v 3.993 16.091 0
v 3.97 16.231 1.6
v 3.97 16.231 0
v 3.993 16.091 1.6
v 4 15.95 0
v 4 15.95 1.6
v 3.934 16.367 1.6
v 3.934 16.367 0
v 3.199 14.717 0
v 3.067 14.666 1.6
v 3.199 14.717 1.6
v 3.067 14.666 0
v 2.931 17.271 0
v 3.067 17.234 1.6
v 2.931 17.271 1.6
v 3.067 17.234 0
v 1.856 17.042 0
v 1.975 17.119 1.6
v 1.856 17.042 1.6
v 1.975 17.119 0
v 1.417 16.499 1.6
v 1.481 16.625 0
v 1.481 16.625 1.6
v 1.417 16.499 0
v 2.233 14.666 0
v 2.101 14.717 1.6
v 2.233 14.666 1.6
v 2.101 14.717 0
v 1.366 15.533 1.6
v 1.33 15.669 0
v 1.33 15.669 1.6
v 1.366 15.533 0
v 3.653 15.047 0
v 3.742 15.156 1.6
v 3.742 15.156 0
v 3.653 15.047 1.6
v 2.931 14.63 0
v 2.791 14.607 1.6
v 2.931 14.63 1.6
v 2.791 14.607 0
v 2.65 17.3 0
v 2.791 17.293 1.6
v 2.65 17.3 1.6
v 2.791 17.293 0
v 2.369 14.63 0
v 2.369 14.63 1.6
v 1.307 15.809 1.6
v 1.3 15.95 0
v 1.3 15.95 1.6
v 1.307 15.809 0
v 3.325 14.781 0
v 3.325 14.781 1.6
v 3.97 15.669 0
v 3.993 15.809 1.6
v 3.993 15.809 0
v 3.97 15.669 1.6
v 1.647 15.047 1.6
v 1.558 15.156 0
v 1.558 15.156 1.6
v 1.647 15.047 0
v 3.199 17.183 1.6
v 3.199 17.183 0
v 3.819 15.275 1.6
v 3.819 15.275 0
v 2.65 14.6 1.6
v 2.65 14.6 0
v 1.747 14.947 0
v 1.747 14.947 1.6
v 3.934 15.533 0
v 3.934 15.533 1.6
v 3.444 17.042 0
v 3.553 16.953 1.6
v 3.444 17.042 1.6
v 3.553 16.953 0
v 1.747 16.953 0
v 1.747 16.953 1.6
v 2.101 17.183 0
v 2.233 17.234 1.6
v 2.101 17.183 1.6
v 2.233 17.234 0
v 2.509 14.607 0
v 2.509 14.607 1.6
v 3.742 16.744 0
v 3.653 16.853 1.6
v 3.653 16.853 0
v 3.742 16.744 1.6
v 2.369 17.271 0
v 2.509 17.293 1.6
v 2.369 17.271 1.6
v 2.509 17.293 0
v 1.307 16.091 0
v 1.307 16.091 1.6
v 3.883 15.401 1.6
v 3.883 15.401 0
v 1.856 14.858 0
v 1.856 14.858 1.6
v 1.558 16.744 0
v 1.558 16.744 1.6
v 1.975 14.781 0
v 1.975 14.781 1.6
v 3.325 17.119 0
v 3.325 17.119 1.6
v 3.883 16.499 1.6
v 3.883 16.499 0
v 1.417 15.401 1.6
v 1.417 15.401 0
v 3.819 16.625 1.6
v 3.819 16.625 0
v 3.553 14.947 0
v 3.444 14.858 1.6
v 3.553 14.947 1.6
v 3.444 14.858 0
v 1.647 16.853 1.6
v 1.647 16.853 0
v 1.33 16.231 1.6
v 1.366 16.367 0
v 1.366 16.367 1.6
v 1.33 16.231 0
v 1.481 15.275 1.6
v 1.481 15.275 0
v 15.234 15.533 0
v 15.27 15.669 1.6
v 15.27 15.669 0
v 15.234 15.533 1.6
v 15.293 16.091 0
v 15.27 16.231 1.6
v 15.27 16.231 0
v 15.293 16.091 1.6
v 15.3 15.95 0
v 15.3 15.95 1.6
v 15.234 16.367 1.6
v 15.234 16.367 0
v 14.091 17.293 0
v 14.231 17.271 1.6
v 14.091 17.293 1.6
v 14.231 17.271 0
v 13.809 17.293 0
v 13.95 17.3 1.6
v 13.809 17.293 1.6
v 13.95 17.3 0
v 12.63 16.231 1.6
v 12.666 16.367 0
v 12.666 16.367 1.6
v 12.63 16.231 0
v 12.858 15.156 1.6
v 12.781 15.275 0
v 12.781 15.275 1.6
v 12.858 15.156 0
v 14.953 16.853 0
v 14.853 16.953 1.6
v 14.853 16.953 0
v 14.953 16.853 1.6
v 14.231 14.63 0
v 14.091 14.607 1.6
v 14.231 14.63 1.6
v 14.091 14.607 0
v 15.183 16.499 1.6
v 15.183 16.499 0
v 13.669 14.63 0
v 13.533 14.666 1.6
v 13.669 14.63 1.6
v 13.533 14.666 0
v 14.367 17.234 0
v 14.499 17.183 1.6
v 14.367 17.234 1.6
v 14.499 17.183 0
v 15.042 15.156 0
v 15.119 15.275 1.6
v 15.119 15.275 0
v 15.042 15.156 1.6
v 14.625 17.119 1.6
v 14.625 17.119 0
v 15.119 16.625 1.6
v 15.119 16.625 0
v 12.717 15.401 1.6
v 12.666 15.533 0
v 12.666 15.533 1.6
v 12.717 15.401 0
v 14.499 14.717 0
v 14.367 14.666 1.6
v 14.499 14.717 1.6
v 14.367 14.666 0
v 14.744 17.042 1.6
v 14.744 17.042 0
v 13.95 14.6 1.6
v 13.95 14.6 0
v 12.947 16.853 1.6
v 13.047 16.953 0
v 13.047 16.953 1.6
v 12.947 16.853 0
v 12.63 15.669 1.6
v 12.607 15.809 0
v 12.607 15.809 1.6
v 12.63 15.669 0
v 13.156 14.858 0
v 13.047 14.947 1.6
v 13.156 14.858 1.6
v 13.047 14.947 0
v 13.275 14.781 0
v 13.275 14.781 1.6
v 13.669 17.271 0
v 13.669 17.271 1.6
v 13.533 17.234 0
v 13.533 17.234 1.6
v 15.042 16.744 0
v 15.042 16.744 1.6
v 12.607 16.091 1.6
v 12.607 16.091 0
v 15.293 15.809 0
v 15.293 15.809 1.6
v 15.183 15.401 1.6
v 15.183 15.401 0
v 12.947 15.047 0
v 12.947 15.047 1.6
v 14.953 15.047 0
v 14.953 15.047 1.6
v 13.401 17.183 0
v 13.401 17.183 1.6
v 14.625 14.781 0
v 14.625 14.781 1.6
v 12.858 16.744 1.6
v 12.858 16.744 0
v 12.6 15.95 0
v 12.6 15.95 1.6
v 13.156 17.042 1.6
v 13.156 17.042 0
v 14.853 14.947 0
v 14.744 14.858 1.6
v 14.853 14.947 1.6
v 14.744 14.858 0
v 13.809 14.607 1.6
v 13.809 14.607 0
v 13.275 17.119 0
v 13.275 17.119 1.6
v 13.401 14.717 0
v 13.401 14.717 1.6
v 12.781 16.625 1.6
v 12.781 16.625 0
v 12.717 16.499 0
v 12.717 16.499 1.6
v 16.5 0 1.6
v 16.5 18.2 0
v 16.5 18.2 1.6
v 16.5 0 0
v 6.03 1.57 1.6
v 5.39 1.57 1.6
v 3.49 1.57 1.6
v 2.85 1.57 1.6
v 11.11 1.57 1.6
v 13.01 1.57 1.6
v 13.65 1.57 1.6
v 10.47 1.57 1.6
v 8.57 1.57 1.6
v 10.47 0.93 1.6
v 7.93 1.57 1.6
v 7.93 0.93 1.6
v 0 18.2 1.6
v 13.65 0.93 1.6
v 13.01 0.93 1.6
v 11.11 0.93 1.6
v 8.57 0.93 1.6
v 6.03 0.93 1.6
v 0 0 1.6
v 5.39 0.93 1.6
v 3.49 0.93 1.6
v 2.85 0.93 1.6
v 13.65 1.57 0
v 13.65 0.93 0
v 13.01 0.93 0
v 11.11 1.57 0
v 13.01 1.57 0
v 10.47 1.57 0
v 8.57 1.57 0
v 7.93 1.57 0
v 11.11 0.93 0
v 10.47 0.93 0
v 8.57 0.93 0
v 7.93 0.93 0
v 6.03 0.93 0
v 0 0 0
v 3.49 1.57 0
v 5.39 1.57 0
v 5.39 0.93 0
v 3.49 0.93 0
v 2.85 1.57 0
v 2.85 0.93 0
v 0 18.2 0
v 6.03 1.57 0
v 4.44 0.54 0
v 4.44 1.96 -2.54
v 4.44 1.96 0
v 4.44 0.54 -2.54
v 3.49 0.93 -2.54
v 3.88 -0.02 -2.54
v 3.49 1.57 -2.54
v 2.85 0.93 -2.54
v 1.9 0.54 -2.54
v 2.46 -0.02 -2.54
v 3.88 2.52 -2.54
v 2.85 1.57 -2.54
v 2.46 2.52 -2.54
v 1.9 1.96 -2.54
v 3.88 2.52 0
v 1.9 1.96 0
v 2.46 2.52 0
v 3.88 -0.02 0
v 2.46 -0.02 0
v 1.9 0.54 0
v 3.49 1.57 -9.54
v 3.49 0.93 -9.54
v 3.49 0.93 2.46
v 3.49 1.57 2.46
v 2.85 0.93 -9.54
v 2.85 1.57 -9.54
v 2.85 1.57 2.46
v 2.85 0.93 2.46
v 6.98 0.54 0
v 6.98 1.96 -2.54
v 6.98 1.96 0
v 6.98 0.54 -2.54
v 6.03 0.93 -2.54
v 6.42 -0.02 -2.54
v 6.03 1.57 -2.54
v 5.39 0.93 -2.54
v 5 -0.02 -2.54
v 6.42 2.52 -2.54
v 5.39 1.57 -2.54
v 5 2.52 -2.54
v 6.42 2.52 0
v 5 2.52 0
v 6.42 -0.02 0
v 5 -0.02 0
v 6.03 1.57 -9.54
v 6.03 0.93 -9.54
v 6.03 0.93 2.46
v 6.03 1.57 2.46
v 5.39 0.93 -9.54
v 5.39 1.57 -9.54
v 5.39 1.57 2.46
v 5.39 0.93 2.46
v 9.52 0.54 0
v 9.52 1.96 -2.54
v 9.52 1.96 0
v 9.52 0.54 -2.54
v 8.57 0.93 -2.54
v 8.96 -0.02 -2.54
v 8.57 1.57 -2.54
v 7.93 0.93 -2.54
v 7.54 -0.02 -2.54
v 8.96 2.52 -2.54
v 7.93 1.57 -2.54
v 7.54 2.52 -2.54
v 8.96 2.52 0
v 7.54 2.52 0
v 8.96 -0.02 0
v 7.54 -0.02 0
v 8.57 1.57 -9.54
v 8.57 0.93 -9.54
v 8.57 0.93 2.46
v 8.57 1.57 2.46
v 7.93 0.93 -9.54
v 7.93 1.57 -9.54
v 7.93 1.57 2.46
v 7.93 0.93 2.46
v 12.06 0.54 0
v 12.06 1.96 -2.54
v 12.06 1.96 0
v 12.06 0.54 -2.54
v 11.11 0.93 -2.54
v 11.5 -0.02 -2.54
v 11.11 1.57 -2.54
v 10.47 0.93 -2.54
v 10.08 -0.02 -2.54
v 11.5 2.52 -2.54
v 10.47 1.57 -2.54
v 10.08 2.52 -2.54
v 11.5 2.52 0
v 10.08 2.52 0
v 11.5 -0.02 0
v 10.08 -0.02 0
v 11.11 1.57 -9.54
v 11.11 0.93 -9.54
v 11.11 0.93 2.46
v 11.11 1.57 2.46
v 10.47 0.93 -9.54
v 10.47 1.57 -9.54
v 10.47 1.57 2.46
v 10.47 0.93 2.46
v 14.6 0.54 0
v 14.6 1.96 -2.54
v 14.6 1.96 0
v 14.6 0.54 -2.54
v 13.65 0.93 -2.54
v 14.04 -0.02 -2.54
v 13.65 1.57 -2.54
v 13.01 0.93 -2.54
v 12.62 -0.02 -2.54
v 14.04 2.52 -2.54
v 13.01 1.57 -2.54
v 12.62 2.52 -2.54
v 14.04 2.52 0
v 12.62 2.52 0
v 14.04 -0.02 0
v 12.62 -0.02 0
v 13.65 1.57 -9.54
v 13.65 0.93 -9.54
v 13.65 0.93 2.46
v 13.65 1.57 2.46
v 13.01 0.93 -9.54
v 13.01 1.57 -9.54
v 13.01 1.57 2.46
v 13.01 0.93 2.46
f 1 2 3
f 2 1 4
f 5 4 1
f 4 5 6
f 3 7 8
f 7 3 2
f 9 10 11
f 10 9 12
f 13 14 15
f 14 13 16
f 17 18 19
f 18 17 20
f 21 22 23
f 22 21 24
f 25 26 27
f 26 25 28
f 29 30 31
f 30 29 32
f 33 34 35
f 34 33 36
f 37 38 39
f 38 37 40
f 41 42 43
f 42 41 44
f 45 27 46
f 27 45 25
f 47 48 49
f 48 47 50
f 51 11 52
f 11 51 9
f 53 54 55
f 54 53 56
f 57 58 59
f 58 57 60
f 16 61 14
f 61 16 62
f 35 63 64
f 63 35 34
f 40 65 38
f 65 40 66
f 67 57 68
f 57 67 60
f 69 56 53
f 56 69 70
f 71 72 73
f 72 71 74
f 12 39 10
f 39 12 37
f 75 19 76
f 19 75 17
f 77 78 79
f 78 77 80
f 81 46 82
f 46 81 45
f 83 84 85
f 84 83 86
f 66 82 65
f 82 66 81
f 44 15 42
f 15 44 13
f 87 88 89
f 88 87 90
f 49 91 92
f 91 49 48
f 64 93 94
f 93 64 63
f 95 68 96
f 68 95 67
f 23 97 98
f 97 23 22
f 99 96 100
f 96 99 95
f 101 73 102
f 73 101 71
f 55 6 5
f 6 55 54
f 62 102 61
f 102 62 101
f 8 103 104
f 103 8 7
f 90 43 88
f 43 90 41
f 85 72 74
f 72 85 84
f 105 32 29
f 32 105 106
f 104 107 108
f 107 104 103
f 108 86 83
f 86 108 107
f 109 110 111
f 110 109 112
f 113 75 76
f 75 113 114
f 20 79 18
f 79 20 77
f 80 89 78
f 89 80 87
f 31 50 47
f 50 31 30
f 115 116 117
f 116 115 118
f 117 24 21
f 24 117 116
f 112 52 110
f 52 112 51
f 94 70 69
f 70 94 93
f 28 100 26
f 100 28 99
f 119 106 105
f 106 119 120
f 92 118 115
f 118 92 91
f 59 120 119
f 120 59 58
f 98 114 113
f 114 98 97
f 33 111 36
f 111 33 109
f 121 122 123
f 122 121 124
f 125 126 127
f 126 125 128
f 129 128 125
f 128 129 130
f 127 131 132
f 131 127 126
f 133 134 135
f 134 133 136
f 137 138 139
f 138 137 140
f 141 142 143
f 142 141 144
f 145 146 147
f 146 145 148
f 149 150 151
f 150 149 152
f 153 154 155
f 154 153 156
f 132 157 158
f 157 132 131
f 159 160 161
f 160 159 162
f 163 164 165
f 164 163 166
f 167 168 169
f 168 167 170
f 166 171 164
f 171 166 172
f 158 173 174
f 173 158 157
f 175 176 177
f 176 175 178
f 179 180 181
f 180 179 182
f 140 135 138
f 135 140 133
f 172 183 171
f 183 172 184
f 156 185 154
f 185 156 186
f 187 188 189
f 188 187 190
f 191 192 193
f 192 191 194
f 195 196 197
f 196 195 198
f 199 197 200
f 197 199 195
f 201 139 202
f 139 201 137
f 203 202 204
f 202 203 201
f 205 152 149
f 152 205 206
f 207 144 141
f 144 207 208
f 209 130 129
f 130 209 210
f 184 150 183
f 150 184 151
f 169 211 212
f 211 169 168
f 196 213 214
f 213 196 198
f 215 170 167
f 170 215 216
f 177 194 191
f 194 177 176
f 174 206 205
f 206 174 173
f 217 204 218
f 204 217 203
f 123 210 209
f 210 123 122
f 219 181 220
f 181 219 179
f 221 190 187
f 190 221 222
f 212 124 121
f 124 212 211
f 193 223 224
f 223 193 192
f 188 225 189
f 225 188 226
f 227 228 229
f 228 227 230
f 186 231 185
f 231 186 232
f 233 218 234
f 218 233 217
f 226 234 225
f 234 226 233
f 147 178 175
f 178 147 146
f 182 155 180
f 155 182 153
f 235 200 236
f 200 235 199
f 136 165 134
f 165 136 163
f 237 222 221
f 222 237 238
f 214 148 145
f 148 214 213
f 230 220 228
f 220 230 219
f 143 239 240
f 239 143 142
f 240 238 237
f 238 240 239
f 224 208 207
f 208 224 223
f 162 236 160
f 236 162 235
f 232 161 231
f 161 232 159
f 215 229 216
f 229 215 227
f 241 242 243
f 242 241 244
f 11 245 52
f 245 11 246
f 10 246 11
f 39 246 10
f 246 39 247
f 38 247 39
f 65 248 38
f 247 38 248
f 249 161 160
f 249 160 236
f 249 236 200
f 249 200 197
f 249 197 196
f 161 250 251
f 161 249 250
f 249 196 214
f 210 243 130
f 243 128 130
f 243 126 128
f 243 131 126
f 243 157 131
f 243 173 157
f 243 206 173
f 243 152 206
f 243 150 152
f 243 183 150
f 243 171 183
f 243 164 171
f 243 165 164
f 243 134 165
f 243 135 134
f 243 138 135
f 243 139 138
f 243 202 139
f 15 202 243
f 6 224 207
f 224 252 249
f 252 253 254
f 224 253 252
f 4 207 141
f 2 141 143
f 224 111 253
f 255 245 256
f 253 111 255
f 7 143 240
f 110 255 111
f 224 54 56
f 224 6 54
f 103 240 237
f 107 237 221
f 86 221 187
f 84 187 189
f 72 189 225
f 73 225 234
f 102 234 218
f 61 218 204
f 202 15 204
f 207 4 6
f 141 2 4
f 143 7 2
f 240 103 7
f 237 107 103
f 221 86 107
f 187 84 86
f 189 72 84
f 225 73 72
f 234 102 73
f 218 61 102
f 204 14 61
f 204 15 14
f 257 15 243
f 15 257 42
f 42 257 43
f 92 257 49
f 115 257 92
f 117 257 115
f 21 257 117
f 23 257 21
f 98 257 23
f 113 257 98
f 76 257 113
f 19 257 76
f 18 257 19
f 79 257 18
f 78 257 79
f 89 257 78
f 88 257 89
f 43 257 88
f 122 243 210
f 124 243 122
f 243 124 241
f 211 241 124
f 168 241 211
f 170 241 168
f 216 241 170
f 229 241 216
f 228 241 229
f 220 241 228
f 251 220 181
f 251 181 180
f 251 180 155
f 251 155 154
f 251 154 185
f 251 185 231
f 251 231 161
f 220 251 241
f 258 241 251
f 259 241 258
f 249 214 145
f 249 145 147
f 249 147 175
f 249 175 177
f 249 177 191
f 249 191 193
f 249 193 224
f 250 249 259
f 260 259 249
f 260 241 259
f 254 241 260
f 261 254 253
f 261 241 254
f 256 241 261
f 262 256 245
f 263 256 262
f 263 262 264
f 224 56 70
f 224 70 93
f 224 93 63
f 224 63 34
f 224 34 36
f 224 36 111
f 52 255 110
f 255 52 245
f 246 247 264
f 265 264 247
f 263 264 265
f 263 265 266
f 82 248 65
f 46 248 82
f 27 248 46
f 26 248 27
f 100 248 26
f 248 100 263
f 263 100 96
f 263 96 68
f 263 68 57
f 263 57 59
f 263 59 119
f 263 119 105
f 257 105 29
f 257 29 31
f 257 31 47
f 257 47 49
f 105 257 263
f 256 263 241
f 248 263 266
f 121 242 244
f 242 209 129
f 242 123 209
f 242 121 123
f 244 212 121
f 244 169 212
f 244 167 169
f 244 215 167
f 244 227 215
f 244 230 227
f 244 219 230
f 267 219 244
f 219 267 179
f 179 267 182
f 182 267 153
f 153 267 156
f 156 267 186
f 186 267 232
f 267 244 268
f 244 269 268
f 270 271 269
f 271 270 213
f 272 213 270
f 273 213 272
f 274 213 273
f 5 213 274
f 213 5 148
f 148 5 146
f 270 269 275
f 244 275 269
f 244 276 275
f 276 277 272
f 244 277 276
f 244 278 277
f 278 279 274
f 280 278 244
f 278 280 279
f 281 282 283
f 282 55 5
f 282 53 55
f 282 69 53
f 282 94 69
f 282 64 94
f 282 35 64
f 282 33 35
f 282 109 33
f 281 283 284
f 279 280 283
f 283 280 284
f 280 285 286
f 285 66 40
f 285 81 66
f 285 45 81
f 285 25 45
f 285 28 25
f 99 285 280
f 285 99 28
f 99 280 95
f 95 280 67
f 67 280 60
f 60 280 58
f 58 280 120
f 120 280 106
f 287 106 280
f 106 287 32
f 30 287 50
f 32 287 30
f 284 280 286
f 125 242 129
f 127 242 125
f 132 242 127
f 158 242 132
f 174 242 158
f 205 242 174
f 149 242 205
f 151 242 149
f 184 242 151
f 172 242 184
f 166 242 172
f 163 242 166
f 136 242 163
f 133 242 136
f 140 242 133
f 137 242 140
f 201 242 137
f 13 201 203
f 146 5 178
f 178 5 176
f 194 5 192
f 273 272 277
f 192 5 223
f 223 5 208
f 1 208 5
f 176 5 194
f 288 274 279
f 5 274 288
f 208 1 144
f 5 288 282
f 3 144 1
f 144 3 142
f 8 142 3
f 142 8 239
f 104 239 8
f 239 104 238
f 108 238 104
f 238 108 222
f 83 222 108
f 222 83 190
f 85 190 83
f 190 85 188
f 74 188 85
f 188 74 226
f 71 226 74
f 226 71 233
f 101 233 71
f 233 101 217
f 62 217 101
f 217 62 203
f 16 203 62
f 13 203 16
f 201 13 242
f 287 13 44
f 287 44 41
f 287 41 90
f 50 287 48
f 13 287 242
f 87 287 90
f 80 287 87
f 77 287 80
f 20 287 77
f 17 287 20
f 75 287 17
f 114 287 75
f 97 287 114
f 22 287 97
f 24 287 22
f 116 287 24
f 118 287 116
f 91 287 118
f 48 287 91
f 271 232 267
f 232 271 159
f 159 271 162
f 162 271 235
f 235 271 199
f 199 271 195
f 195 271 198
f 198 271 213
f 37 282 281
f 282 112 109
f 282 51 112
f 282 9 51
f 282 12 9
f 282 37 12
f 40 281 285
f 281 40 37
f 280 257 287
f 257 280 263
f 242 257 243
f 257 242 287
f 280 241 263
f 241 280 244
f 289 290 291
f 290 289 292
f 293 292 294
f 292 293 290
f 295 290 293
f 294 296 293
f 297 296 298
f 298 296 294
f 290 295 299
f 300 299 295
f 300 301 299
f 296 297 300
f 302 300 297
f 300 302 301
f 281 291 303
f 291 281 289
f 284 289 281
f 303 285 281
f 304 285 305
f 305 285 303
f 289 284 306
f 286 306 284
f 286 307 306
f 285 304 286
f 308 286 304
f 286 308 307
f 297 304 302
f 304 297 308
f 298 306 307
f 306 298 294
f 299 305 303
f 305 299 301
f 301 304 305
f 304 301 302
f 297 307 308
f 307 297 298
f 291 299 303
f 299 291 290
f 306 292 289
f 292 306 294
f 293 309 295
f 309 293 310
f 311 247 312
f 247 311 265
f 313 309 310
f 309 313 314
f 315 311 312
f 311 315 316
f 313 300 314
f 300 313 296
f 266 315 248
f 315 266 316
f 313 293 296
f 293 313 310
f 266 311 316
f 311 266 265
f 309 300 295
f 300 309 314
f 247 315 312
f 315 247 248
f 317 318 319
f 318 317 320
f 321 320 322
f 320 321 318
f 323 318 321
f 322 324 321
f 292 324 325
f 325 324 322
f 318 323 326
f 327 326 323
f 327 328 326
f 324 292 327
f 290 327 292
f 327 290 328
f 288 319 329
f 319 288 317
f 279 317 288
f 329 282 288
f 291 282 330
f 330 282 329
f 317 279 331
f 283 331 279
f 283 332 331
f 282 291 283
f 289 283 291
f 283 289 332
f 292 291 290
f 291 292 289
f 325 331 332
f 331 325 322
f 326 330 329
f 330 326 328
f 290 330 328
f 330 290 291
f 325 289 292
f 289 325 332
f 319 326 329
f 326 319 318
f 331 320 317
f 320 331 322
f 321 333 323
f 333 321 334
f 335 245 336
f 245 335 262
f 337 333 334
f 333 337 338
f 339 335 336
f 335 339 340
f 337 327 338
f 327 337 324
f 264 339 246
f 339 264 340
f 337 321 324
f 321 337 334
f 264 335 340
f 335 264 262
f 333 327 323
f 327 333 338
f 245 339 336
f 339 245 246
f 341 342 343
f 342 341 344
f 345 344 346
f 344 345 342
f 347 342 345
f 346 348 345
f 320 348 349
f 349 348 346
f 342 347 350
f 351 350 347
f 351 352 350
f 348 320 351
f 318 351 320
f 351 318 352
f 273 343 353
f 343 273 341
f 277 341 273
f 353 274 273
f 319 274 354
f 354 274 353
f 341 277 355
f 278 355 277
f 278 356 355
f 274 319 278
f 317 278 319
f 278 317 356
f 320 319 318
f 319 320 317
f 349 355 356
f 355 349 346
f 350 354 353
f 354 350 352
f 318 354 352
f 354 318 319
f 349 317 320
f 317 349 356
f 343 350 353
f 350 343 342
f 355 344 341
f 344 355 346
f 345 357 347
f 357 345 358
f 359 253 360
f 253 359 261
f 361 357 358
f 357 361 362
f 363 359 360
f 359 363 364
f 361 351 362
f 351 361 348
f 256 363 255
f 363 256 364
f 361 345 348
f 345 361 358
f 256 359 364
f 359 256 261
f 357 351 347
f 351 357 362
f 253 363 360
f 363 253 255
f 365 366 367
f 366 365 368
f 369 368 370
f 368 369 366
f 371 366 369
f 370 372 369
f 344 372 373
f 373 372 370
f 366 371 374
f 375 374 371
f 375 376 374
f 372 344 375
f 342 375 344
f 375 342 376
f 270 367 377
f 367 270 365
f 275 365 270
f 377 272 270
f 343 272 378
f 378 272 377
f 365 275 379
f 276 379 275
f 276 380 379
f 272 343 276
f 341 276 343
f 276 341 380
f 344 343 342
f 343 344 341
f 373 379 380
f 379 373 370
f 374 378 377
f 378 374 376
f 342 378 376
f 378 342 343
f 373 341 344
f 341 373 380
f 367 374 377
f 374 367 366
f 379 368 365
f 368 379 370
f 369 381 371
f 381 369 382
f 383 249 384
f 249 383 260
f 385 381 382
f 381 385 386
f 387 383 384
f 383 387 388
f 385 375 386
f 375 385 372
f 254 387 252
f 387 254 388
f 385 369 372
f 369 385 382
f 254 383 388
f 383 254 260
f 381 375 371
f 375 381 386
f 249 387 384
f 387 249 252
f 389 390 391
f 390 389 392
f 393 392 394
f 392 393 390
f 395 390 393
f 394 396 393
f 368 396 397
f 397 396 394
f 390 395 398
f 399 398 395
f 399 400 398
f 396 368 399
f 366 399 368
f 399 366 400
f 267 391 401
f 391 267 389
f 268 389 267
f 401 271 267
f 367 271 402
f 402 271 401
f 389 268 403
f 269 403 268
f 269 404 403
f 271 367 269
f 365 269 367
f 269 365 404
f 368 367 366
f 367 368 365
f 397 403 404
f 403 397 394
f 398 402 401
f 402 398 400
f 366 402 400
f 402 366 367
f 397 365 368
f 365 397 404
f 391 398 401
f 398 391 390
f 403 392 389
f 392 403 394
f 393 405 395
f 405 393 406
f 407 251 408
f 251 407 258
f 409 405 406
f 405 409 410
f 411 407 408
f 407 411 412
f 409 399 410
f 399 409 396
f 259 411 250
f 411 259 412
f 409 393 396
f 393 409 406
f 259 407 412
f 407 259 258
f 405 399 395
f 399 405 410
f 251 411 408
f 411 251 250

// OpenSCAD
// file: pin_headers.scad
// pin_headers.scad
//
// Model of through-hole pin headers. 
// 
// Units are metric
//
// "height" is the total length of the pin. Default is 12mm.
// "upper" is the length of the pin above the stopper. Default is 7mm.
// "rows" is the number of rows. Default is 3.
// "cols" is the number of columns. Default is 2.
//
// Examples:
// pin_header( 12, 7, 2, 5);
// pin_header( rows=5 cols=1 );
// By Paul McGovern

module pin_header( height=12, upper=7, rows=3, cols=2 ) {

	cl = 2.54;

	translate( [ -(rows  * cl/2 ) + cl /2, -(cols  * cl/2 ) + cl /2, 0 ] ) {

		for( col = [0: cols -1 ] ) {
			for( row = [0 : rows -1 ] ) {

				translate( [ cl * row , cl * col, 0] ) {
	
					color( "gray" )
						translate( [0,0, cl / 2]) {
							intersection() {
								cube( [ cl, cl, cl ], center=true );
								rotate( [0, 0, 45] ) cube( [ 2.8, 2.8, cl ], center=true );
						}
				}

				color( "silver" ) {
					translate( [0,0, (upper - ( height/2 )) + cl ] ) {
						union() {
							cube( [0.64,0.64,height], center=true );
							translate( [0,0, height/2 ] ) scale( 0.64 ) _pin_point();
							translate( [0,0, -height/2 ] ) scale( 0.64 )	rotate([180,0,0] )_pin_point();
						}
					}
				}
			}
		}
	}
}
}

module _pin_point() {
	translate( [-0.5,-0.5, 0])
		polyhedron( 
			points=[[0,0,0],[0,1,0],[1,1,0],[1,0,0],[0.5,0.5,0.5]], 
			triangles=[[0,1,2],[0,2,3],[0,1,4],[1,2,4],[2,3,4],[3,0,4]]);
}
// file: sensor_modules.scad
// Sensor modules from Adafruit
// License GNU AFFERO GENERAL PUBLIC LICENSE v3+
// Copyright 2014 Christian Ege <k4230r6@gmail.com>


use <pin_headers.scad>;

sensor_drill_holes = 2.3;
sensor_z = 1.6;

// Humidity
htu21d_x = 16.5;
htu21d_y = 18.2;
htu21d_z = sensor_z;
htu21d_holes = [  [2.45,15.75],  [13.75,15.75]];

// Lux - Sensor
tsl2591_x = 19.1;
tsl2591_y = 16.4;
tsl2591_z = sensor_z;
tsl2591_holes = [ [2.45,13.7],  [15.15,13.7] ];

// Presure Sensor
bmp180_x = 17.6;
bmp180_y = 19.3;
bmp180_z = sensor_z;
bmp180_holes = [  [2.45,17.0],  [15.15,17.0]  ];


module base_sensor(clearance = 0,  size , holes, drill,rows) {
	echo( "size: ",size[0],size[1],size[2]);
	echo ("holes: ",holes);
	echo("drill: ", drill);
	echo("clearance:",clearance);
	difference () {
		cube(size);
		for(i = holes ) {
			translate ([clearance,clearance,-clearance]) {
				translate (i) {
					#cylinder(h =  size[2]+2*clearance , r=((drill/2)+clearance), $fn=60 ) ;
				}
			}
		}
	}
	translate([(size[0])/2,+1.25,0]) {
		rotate([180,0,0]) {
			pin_header(rows=rows,cols=1);
		}
	}
}


module htu21d (clearance = 0.0,drill=sensor_drill_holes)  {
	base_sensor(clearance = clearance, size=[htu21d_x,htu21d_y,htu21d_z], holes=htu21d_holes, drill=drill,rows=5) ;
}

module tsl2591 (clearance=0.0,drill=sensor_drill_holes )  {
	base_sensor(clearance = clearance, size=[tsl2591_x,tsl2591_y,tsl2591_z], holes=tsl2591_holes, drill=drill,rows=6) ;
}

module bmp180 (clearance=0.0, drill=sensor_drill_holes )  {
	base_sensor(clearance=clearance, size=[bmp180_x,bmp180_y,bmp180_z], holes=bmp180_holes, drill=drill,rows=5) ;
}

//bmp180(clearance=0.2, drill = sensor_drill_holes);
//tsl2591 (clearance=0.2, drill = sensor_drill_holes );
htu21d(clearance=0.2, drill = sensor_drill_holes );
// main file
// Sensor HTU21DF module from Adafruit
// https://www.adafruit.com/products/1899
//
// License GNU AFFERO GENERAL PUBLIC LICENSE v3+
// Copyright 2014 Christian Ege <k4230r6@gmail.com>

use <sensor_modules.scad>;

htu21d(clearance=0.2);
